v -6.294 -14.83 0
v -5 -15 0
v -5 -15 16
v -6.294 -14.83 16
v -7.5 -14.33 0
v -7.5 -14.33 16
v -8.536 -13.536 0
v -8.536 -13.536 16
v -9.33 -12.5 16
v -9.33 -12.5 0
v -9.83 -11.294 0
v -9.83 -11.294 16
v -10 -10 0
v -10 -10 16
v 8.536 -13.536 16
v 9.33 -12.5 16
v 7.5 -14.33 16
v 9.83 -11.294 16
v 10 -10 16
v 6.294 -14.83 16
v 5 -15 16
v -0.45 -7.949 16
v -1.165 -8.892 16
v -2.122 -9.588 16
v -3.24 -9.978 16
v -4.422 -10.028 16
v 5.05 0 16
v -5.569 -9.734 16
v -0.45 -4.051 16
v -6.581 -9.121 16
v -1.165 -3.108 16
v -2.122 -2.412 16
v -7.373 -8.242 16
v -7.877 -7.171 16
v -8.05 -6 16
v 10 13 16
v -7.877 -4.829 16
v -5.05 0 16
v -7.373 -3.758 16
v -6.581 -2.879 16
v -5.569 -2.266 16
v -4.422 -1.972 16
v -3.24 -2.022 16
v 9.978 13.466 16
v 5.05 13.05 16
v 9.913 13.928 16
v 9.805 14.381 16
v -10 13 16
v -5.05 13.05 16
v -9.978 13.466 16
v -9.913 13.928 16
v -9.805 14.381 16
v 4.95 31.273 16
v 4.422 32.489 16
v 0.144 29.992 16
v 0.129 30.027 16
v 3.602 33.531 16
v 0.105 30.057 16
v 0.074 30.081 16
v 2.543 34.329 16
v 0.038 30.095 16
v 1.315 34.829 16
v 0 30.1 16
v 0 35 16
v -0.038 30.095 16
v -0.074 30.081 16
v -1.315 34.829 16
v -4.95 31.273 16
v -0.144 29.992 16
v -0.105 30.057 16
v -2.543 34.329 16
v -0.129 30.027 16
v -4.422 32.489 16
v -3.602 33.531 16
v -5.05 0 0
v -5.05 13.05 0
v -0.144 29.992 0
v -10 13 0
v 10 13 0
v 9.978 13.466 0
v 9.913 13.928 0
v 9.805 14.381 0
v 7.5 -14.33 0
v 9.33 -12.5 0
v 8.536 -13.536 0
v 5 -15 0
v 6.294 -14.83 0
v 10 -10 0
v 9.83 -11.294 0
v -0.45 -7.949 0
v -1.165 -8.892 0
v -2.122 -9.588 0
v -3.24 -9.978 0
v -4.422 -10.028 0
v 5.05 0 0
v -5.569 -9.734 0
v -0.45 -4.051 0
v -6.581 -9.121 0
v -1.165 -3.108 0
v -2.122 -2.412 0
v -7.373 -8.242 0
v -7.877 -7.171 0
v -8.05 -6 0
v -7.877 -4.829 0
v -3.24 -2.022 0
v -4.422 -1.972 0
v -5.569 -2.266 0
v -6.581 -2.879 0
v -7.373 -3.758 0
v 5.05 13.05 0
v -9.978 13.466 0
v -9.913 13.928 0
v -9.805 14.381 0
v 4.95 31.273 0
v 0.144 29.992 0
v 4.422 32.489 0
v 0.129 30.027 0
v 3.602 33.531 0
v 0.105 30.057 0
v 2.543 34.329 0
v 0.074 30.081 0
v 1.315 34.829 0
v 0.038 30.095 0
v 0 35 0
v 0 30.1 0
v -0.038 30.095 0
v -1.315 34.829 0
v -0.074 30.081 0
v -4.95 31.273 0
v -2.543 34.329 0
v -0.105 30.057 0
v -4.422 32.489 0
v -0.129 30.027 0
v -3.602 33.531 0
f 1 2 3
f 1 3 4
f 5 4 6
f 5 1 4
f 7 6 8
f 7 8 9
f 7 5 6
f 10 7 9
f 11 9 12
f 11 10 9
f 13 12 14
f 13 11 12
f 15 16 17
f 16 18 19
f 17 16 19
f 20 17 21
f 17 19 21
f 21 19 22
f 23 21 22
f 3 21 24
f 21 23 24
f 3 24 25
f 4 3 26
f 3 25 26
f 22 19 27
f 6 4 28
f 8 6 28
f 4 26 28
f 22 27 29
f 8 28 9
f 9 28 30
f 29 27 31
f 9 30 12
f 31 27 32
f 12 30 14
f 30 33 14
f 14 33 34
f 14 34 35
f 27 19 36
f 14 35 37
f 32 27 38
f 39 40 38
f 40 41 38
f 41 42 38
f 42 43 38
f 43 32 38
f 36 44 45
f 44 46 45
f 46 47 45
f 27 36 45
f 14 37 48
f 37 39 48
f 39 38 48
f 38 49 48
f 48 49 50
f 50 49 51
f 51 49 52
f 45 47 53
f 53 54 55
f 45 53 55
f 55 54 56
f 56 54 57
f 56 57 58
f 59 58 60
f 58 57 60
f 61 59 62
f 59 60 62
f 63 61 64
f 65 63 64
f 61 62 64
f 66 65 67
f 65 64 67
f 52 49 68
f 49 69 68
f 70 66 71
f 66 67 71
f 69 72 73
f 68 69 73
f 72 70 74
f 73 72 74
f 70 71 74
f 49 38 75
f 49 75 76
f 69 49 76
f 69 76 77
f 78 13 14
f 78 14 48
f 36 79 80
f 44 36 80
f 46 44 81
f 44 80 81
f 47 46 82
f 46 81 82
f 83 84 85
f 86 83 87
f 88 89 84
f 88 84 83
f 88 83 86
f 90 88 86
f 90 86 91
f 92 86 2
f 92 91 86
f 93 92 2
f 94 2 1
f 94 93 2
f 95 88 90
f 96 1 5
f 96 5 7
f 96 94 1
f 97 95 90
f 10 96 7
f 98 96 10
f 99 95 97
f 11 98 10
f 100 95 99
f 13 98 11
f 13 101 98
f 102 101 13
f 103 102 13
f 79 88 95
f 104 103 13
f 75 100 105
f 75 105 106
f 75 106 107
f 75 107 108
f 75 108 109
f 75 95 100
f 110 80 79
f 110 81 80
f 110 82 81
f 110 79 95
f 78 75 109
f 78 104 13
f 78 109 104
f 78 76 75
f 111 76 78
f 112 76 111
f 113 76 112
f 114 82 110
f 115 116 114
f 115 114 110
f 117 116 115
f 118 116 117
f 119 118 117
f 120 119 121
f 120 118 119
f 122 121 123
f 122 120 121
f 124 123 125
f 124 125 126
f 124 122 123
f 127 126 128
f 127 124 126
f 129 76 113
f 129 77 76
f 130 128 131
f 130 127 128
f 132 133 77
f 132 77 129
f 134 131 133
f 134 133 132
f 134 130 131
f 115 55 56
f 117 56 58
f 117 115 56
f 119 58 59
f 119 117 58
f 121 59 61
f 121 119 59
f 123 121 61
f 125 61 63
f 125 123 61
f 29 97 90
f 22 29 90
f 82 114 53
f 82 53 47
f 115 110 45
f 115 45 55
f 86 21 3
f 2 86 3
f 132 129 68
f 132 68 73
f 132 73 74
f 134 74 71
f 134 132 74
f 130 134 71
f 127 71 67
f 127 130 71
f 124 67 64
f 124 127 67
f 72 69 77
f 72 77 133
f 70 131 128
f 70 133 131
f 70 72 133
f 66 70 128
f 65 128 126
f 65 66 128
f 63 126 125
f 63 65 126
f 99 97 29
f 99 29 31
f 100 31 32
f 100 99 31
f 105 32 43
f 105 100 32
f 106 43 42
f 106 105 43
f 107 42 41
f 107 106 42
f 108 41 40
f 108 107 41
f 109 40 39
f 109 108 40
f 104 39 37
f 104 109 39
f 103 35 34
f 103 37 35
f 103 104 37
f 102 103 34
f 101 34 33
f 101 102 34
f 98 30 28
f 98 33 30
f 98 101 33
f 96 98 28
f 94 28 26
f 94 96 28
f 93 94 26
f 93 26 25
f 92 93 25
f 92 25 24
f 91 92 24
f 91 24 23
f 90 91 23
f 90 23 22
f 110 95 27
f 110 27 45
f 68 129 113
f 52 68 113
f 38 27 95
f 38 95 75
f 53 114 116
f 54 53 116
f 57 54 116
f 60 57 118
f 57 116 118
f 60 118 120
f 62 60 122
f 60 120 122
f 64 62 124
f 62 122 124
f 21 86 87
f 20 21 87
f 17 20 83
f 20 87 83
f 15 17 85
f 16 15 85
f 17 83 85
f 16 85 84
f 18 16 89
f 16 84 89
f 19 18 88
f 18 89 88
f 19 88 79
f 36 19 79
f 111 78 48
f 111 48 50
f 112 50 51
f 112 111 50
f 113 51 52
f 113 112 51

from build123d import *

# Parameters (mm, degrees)
PAD_DEPTH            = 16
POCKET_DEPTH         = 106.884114
POCKET_DEPTH_BACK    = 122.884114
POCKET001_DEPTH      = 0.001
POCKET001_DEPTH_BACK = 16.001


with BuildPart() as part:
    # Sketch → Pad (new body)
    with BuildSketch(Plane.XY):
        with BuildLine():
            ThreePointArc((4.949542, 31.272861), (3.097964, 33.964015), (0, 35))
            Line((0, -15), (0, 35))
            Line((0, -15), (5, -15))
            ThreePointArc((5, -15), (8.535534, -13.535534), (10, -10))
            Line((10, -10), (10, 13))
            ThreePointArc((10, 13), (9.951106, 13.69753), (9.805381, 14.381419))
            Line((4.949542, 31.272861), (9.805381, 14.381419))
        make_face()
    pad = extrude(amount=PAD_DEPTH)

    # Sketch001 → Pocket (cut, two sides)
    with BuildSketch(Plane.XY) as pocket_sk:
        with BuildLine():
            Line((0, 0), (5.05, 0))
            Line((5.05, 0), (5.05, 13.05))
            Line((5.05, 13.05), (0.144081, 29.991722))
            ThreePointArc((0.144081, 29.991722), (0.090116, 30.069913), (0, 30.1))
            Line((0, 30.1), (0, 0))
        make_face()
    pocket = extrude(amount=-POCKET_DEPTH, mode=Mode.SUBTRACT) + extrude(pocket_sk.sketch, amount=POCKET_DEPTH_BACK, mode=Mode.SUBTRACT)

    # Mirrored: Pad, Pocket across Sketch V_Axis
    add(pad.mirror(Plane(origin=(0, 0, 0), x_dir=(0, 0, 1), z_dir=(1, 0, 0))))
    add(pocket.mirror(Plane(origin=(0, 0, 0), x_dir=(0, 0, 1), z_dir=(1, 0, 0))), mode=Mode.SUBTRACT)

    # Sketch002 → Pocket001 (cut, two sides)
    with BuildSketch(Plane(origin=(-4, -6, 0), x_dir=(1, 0, 0), z_dir=(0, 0, 1))) as pocket001_sk:
        with BuildLine():
            ThreePointArc((3.55, 1.949359), (-4.05, 0), (3.55, -1.949359))
            Line((3.55, 1.949359), (3.55, -1.949359))
        make_face()
    extrude(amount=-POCKET001_DEPTH, mode=Mode.SUBTRACT)
    extrude(pocket001_sk.sketch, amount=POCKET001_DEPTH_BACK, mode=Mode.SUBTRACT)


solid = part.part
